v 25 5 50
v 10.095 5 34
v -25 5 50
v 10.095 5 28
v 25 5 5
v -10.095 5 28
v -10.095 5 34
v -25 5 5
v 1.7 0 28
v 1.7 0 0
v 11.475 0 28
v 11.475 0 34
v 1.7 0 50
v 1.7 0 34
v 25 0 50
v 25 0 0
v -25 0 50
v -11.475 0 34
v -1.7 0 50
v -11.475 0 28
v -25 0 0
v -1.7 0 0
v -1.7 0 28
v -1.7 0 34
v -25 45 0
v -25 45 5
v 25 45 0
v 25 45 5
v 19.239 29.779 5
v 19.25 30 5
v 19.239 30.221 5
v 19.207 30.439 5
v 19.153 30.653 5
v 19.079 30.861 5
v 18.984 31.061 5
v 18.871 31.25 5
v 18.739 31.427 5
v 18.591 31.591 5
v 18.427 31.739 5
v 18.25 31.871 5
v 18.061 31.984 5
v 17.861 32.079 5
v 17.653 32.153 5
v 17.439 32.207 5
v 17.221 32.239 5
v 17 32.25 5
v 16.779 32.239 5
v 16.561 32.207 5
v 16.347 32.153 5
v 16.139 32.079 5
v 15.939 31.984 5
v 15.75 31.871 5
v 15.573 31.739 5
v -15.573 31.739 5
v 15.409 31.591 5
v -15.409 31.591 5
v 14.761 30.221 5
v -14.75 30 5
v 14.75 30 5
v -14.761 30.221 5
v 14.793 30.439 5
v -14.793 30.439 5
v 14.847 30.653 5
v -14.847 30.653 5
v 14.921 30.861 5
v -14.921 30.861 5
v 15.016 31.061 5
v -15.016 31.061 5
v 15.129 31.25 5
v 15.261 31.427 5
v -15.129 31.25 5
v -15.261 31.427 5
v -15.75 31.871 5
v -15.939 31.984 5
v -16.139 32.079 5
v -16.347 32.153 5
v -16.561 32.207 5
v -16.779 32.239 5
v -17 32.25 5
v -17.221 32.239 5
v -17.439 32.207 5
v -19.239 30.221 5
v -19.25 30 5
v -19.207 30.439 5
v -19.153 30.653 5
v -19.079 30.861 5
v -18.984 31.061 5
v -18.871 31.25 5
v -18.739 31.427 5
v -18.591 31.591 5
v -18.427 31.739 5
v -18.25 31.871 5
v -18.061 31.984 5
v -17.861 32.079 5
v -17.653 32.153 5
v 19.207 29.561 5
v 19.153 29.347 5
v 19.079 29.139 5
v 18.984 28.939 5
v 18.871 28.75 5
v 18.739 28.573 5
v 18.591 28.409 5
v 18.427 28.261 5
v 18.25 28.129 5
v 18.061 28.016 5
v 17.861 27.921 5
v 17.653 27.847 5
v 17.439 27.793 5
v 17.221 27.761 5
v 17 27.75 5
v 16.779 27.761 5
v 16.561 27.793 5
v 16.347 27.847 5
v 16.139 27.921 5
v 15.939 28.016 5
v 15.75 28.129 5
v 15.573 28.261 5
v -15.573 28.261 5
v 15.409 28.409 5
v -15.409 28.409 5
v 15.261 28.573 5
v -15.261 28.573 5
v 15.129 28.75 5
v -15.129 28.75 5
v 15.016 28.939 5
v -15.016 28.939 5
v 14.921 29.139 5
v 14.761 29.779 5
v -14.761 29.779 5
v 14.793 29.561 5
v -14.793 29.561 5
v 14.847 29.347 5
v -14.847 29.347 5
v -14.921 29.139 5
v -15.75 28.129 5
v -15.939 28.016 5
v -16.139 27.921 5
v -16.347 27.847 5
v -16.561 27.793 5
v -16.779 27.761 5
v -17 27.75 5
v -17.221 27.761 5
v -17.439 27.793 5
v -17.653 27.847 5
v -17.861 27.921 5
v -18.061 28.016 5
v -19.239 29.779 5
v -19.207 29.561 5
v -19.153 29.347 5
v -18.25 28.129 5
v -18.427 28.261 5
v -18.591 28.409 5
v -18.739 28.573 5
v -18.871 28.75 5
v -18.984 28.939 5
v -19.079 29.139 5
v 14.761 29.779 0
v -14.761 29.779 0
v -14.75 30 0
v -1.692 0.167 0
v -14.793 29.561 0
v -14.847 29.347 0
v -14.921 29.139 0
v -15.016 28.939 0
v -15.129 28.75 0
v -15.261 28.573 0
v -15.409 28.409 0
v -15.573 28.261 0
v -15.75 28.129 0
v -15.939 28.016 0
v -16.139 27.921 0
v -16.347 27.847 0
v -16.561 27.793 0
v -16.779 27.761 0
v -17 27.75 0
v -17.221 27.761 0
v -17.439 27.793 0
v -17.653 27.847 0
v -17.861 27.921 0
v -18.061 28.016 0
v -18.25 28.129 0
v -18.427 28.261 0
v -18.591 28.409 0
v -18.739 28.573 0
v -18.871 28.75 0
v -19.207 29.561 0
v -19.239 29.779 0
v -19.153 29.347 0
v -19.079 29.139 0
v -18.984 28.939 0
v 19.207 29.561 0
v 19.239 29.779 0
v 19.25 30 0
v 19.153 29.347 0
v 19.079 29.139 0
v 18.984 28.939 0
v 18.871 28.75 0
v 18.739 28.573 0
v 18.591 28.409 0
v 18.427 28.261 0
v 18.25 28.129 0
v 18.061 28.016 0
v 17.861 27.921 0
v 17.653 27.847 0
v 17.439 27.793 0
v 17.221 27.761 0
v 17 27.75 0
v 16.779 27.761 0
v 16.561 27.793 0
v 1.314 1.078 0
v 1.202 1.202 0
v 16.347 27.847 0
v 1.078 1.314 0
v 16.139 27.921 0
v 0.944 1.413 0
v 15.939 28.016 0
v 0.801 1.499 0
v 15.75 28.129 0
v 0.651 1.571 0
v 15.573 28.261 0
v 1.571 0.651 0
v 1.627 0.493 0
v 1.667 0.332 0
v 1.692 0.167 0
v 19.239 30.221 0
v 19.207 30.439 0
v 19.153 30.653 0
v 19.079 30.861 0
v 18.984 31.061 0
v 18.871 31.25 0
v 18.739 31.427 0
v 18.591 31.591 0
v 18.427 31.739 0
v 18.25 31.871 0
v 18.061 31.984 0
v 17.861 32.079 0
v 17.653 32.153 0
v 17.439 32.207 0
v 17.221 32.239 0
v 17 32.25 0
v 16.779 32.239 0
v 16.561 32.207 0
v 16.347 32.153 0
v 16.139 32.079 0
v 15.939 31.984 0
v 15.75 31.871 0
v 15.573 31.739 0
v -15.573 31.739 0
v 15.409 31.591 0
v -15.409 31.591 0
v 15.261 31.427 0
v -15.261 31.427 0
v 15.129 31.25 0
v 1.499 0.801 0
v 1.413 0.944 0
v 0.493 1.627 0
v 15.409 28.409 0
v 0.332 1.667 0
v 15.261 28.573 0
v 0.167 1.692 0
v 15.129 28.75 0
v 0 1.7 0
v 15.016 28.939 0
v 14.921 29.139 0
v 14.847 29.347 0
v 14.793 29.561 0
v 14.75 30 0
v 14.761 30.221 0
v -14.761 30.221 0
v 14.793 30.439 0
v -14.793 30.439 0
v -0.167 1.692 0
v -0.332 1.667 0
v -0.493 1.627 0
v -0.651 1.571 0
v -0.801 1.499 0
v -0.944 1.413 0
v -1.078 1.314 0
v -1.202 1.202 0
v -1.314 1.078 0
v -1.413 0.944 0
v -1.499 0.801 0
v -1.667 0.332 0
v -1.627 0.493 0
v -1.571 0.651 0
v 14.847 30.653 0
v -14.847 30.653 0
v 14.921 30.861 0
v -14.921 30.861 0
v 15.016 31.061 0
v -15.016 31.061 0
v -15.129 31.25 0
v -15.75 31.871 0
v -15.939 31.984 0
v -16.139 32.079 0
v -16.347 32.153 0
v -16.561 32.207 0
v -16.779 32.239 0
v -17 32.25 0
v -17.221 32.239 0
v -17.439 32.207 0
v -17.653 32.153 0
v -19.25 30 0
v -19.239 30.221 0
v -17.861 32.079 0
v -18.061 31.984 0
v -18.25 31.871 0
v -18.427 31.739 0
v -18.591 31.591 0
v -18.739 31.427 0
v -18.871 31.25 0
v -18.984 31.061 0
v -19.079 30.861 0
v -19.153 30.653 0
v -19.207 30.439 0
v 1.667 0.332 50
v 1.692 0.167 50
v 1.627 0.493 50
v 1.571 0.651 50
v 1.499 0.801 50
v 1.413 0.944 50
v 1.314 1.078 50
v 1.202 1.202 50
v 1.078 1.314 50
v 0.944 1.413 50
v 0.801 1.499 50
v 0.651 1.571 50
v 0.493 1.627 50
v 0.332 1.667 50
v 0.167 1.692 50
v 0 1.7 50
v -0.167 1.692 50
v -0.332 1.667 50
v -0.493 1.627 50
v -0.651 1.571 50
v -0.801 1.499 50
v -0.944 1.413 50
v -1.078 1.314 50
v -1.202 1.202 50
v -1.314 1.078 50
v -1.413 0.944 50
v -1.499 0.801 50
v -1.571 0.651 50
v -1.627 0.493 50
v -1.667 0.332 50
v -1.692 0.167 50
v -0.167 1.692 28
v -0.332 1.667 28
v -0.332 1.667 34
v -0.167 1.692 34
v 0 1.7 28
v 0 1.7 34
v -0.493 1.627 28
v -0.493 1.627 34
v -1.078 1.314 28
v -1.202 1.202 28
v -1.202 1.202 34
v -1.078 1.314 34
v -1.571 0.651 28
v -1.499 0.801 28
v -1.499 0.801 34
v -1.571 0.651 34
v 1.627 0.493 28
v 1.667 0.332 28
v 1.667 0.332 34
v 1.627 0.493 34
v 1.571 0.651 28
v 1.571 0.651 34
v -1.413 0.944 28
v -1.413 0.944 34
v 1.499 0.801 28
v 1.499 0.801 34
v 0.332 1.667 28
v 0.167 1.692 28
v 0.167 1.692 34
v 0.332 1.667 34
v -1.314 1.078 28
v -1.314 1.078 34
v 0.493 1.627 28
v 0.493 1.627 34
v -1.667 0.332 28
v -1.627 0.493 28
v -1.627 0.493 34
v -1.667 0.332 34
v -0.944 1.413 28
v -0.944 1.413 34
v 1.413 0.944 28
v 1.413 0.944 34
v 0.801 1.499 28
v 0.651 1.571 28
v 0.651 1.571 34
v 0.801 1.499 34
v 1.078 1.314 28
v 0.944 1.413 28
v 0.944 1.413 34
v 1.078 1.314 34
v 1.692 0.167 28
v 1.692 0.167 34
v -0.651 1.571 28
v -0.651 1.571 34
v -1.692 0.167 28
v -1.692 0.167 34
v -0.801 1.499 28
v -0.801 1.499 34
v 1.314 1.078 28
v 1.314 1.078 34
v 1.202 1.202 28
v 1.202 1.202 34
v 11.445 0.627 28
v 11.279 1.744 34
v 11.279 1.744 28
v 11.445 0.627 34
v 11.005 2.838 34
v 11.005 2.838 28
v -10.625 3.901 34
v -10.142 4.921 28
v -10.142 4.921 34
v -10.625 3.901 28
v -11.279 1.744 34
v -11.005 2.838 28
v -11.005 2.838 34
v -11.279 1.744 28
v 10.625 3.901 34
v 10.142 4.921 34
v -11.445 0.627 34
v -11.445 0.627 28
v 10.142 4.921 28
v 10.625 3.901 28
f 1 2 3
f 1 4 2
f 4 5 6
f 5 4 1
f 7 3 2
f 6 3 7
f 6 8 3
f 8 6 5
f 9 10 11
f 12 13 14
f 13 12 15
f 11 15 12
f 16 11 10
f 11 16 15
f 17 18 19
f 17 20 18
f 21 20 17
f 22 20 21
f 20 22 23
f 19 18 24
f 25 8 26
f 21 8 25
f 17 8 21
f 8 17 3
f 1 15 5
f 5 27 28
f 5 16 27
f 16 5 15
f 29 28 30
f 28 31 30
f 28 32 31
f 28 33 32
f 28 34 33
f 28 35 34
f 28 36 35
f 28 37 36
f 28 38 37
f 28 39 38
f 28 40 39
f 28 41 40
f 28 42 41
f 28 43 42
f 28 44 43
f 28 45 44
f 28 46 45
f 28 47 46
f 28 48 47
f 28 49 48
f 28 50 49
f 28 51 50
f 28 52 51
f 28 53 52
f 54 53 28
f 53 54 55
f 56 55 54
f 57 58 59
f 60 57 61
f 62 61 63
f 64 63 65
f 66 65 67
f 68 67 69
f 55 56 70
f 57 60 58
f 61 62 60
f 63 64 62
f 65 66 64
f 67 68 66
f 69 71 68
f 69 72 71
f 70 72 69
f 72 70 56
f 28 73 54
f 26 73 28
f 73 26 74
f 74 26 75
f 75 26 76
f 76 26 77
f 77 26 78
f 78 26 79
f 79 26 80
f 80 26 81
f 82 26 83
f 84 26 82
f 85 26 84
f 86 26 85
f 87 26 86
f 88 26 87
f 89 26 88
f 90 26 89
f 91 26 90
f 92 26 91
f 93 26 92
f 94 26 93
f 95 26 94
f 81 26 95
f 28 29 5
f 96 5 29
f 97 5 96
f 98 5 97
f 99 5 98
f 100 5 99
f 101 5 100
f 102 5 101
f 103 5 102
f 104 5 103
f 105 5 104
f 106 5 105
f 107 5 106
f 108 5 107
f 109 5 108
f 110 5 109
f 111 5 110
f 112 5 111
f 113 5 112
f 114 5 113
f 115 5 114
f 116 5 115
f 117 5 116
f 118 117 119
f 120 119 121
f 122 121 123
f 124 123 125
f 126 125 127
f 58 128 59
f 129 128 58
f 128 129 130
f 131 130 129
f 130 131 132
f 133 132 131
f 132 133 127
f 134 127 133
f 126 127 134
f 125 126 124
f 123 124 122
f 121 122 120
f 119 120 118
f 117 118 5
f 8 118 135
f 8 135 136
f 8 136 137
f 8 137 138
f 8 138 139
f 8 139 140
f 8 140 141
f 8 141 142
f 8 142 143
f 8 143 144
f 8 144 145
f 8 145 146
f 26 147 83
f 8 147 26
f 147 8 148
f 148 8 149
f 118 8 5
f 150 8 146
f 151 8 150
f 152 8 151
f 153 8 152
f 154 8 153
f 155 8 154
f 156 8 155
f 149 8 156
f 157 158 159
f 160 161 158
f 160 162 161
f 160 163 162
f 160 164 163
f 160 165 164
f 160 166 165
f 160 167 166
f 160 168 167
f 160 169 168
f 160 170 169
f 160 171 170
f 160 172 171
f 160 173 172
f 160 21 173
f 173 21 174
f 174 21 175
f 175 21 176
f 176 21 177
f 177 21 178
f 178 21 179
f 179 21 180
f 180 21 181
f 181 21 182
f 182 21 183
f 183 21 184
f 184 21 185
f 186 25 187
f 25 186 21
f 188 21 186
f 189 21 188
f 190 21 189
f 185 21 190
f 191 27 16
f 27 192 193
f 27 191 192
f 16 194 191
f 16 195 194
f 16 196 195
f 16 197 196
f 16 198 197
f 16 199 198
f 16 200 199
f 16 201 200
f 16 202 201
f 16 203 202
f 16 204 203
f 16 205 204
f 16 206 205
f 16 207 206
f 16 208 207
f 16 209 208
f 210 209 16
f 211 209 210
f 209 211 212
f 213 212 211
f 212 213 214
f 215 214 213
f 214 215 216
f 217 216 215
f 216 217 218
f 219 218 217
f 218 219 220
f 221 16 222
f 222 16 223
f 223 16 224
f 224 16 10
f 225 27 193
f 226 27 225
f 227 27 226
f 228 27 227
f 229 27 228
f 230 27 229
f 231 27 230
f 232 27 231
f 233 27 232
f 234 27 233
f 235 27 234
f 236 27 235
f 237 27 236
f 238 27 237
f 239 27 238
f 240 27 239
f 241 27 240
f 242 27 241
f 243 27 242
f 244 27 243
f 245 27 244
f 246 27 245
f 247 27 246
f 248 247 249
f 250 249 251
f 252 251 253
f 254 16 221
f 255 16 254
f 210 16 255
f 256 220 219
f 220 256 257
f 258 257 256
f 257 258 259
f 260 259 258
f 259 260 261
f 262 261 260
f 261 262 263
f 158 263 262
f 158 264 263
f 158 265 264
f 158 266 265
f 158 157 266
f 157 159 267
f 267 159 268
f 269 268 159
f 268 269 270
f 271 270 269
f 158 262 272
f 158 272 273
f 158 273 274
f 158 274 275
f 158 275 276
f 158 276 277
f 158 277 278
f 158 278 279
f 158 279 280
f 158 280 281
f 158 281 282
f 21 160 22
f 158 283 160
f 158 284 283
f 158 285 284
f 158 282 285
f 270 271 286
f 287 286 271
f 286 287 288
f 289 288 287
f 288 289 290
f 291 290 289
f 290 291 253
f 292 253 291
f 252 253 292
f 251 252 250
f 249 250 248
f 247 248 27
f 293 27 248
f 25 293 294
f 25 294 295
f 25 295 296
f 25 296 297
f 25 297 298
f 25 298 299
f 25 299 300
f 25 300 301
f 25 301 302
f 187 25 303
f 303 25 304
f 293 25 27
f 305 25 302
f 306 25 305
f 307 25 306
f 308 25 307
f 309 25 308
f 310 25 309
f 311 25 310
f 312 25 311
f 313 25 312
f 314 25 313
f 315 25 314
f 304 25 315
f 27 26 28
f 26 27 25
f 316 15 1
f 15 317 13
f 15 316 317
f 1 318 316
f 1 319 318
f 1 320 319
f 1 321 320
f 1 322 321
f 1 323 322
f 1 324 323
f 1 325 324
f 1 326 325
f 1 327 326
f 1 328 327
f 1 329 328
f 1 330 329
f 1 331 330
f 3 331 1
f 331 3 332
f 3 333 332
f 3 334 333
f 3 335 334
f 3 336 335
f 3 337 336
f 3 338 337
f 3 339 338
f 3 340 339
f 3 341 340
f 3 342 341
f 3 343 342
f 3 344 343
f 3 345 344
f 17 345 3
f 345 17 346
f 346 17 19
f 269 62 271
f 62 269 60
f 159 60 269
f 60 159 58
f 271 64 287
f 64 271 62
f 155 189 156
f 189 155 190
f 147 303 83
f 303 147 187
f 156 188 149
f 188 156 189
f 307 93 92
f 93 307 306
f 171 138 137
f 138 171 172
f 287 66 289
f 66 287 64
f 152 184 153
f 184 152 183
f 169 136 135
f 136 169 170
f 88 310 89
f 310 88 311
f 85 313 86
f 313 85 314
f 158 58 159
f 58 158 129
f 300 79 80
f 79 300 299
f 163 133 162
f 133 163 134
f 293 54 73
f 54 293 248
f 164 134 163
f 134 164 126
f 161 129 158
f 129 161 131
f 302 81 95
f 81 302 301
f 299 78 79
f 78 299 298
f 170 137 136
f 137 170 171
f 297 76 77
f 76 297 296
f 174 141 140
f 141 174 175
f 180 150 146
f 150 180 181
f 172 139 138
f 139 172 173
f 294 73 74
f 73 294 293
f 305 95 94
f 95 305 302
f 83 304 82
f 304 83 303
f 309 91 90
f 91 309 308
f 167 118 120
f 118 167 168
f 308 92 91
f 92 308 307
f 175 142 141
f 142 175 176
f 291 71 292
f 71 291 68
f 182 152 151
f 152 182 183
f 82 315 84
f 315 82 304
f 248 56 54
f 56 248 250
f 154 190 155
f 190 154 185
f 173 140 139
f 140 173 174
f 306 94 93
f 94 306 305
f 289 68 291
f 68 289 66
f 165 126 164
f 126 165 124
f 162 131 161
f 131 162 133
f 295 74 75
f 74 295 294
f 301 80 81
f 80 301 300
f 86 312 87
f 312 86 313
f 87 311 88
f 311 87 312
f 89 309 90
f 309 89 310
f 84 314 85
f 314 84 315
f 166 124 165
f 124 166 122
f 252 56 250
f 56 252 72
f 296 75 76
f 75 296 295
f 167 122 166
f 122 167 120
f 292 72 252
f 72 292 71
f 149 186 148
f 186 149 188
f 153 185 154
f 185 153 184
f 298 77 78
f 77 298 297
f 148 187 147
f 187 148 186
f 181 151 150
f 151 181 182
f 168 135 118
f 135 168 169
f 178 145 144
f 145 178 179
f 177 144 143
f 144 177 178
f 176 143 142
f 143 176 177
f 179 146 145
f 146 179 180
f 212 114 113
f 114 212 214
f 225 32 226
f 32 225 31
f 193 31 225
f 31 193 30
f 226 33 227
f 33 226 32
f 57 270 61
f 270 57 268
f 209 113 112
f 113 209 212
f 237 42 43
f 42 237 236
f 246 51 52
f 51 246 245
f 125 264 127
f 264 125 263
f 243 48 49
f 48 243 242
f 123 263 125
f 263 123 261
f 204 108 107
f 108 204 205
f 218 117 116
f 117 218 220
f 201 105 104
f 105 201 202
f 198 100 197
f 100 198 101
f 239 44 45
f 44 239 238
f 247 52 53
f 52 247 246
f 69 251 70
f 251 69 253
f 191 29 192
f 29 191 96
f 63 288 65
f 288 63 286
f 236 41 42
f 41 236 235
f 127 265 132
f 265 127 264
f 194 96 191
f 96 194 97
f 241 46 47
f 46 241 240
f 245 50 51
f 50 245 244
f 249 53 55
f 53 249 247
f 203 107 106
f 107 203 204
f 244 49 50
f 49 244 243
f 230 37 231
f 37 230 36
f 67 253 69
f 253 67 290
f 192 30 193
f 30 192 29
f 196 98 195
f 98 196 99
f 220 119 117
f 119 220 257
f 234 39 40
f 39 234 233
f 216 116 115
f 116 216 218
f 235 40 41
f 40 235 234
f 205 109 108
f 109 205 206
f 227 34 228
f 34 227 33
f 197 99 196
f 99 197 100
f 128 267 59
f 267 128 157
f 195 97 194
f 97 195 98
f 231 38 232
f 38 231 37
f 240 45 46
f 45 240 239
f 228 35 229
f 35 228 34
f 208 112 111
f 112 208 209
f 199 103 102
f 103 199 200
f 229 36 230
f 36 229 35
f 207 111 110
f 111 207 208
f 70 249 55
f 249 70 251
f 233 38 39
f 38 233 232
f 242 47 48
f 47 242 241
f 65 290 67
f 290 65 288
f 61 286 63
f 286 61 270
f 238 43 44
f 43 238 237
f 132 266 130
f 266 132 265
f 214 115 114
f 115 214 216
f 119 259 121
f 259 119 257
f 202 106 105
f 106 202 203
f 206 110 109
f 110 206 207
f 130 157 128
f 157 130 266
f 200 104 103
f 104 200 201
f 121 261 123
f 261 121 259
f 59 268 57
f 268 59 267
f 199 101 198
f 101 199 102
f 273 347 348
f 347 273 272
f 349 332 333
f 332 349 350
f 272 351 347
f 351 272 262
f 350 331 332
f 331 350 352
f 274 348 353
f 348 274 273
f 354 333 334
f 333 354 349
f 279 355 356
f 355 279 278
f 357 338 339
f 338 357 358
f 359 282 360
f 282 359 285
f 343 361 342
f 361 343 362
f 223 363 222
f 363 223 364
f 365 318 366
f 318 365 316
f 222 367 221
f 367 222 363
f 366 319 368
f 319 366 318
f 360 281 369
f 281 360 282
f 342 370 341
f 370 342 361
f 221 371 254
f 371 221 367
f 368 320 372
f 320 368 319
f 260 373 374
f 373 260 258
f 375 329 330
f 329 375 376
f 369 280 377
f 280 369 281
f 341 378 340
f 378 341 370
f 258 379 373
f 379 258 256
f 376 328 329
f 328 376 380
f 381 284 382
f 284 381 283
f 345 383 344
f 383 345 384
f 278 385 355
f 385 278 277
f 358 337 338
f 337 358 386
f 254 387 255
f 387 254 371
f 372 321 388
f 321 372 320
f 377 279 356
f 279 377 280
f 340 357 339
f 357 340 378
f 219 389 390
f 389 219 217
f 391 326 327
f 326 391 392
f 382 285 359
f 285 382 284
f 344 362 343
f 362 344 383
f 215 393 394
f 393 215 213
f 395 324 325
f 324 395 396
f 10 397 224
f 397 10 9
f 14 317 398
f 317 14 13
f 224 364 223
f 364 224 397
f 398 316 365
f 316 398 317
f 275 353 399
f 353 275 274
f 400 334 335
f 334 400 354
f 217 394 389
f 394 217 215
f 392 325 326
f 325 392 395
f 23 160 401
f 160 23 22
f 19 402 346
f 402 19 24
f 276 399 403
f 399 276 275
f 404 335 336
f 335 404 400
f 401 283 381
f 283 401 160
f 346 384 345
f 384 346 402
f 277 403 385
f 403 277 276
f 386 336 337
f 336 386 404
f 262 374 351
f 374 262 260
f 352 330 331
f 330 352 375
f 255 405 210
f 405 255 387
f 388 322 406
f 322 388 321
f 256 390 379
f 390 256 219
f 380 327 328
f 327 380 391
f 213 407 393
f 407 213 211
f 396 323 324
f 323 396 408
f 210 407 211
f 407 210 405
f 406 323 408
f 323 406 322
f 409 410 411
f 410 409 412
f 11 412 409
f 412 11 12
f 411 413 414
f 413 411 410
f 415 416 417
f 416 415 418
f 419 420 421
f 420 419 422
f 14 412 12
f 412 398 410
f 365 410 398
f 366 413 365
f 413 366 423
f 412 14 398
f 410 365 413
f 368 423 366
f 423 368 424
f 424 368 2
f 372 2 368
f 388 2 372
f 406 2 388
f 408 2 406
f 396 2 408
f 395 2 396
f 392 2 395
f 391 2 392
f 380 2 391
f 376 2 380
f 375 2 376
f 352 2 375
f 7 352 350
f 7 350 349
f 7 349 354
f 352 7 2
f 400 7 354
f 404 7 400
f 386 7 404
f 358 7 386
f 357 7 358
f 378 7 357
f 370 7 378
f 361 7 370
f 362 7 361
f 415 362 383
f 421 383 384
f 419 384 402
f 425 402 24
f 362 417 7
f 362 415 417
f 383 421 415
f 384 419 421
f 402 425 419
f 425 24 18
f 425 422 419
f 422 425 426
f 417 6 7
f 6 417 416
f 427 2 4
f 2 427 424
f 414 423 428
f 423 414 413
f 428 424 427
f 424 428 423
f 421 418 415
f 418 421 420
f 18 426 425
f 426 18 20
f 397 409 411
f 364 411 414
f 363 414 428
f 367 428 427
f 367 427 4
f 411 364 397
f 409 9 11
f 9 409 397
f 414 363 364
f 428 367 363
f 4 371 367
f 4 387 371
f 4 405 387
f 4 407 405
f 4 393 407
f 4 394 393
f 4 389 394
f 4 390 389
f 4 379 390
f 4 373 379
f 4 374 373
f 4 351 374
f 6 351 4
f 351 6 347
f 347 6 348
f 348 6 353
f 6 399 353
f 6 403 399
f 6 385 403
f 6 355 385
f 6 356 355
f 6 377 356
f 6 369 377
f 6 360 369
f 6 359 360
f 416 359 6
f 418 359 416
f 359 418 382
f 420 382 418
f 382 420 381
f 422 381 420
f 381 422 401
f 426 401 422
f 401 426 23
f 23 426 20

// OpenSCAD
// L-shaped mounting bracket for NEMA 17 stepper motor
// Print orientation: base plate on bed, motor plate building up in +Z

$fn = 64;

// ---- Base plate ----
base_x0 = -25;   // x start
base_x1 = 25;    // x end
base_y0 = 0;     // y start
base_y1 = 45;    // y end
base_z0 = 0;     // z start
base_z1 = 5;     // z end

// ---- Through holes (M4) ----
hole_x  = -17;   // hole 1 x
hole_y  = 30;    // hole 1 y
hole_d  = 4.5;   // hole diameter
hole_x2 = 17;    // hole 2 x
hole_y2 = 30;    // hole 2 y

// ---- Motor plate ----
motor_x0 = -25;  // x start
motor_x1 = 25;   // x end
motor_y0 = 0;    // y start
motor_y1 = 5;    // y end
motor_z0 = 0;    // z start
motor_z1 = 50;   // z end

// ---- Boss hole (motor centring) ----
boss_d  = 23;    // hole diameter
boss_x  = 0;     // hole centre x
boss_z  = 28;    // hole centre z

// ---- Screw holes (M3) ----
screw_d  = 3.4;  // hole diameter
screw_n  = 4;    // number of holes
screw_a  = 31;   // square pattern size

// ---- Gussets ----
gusset_t = 5;    // thickness
gusset_x0 = -25; // left edge x
gusset_x1 = -20; // right edge x
gusset_y0 = 5;   // right-angle corner y
gusset_z0 = 5;   // right-angle corner z
gusset_h = 20;   // leg length along +Y and +Z

// ---- Misc ----
eps = 0.5;       // cutter overshoot

difference() {
    union() {
        // Base plate
        translate([base_x0, base_y0, base_z0])
            cube([base_x1 - base_x0, base_y1 - base_y0, base_z1 - base_z0]);

        // Motor plate
        translate([motor_x0, motor_y0, motor_z0])
            cube([motor_x1 - motor_x0, motor_y1 - motor_y0, motor_z1 - motor_z0]);

        // Gussets (right triangle in YZ, extruded along X)
        for (x = [gusset_x0, gusset_x1])
            translate([x, gusset_y0, gusset_z0])
                rotate([90, 0, 0])
                    linear_extrude(height = gusset_t)
                        polygon(points = [[0, 0], [gusset_h, 0], [0, gusset_h]]);
    }

    // Base plate through holes
    for (h = [[hole_x, hole_y], [hole_x2, hole_y2]])
        translate([h[0], h[1], -eps])
            cylinder(d = hole_d, h = base_z1 - base_z0 + 2 * eps);

    // Boss hole
    translate([boss_x, -eps, boss_z])
        cylinder(d = boss_d, h = motor_y1 - motor_y0 + 2 * eps);

    // Screw holes
    for (i = [0 : screw_n - 1])
        rotate([0, 0, i < screw_n - 1 ? 90 : 0])
            translate([0, screw_a * i, 0])
                cylinder(d = screw_d, h = motor_z1 - motor_z0 + eps);
}
